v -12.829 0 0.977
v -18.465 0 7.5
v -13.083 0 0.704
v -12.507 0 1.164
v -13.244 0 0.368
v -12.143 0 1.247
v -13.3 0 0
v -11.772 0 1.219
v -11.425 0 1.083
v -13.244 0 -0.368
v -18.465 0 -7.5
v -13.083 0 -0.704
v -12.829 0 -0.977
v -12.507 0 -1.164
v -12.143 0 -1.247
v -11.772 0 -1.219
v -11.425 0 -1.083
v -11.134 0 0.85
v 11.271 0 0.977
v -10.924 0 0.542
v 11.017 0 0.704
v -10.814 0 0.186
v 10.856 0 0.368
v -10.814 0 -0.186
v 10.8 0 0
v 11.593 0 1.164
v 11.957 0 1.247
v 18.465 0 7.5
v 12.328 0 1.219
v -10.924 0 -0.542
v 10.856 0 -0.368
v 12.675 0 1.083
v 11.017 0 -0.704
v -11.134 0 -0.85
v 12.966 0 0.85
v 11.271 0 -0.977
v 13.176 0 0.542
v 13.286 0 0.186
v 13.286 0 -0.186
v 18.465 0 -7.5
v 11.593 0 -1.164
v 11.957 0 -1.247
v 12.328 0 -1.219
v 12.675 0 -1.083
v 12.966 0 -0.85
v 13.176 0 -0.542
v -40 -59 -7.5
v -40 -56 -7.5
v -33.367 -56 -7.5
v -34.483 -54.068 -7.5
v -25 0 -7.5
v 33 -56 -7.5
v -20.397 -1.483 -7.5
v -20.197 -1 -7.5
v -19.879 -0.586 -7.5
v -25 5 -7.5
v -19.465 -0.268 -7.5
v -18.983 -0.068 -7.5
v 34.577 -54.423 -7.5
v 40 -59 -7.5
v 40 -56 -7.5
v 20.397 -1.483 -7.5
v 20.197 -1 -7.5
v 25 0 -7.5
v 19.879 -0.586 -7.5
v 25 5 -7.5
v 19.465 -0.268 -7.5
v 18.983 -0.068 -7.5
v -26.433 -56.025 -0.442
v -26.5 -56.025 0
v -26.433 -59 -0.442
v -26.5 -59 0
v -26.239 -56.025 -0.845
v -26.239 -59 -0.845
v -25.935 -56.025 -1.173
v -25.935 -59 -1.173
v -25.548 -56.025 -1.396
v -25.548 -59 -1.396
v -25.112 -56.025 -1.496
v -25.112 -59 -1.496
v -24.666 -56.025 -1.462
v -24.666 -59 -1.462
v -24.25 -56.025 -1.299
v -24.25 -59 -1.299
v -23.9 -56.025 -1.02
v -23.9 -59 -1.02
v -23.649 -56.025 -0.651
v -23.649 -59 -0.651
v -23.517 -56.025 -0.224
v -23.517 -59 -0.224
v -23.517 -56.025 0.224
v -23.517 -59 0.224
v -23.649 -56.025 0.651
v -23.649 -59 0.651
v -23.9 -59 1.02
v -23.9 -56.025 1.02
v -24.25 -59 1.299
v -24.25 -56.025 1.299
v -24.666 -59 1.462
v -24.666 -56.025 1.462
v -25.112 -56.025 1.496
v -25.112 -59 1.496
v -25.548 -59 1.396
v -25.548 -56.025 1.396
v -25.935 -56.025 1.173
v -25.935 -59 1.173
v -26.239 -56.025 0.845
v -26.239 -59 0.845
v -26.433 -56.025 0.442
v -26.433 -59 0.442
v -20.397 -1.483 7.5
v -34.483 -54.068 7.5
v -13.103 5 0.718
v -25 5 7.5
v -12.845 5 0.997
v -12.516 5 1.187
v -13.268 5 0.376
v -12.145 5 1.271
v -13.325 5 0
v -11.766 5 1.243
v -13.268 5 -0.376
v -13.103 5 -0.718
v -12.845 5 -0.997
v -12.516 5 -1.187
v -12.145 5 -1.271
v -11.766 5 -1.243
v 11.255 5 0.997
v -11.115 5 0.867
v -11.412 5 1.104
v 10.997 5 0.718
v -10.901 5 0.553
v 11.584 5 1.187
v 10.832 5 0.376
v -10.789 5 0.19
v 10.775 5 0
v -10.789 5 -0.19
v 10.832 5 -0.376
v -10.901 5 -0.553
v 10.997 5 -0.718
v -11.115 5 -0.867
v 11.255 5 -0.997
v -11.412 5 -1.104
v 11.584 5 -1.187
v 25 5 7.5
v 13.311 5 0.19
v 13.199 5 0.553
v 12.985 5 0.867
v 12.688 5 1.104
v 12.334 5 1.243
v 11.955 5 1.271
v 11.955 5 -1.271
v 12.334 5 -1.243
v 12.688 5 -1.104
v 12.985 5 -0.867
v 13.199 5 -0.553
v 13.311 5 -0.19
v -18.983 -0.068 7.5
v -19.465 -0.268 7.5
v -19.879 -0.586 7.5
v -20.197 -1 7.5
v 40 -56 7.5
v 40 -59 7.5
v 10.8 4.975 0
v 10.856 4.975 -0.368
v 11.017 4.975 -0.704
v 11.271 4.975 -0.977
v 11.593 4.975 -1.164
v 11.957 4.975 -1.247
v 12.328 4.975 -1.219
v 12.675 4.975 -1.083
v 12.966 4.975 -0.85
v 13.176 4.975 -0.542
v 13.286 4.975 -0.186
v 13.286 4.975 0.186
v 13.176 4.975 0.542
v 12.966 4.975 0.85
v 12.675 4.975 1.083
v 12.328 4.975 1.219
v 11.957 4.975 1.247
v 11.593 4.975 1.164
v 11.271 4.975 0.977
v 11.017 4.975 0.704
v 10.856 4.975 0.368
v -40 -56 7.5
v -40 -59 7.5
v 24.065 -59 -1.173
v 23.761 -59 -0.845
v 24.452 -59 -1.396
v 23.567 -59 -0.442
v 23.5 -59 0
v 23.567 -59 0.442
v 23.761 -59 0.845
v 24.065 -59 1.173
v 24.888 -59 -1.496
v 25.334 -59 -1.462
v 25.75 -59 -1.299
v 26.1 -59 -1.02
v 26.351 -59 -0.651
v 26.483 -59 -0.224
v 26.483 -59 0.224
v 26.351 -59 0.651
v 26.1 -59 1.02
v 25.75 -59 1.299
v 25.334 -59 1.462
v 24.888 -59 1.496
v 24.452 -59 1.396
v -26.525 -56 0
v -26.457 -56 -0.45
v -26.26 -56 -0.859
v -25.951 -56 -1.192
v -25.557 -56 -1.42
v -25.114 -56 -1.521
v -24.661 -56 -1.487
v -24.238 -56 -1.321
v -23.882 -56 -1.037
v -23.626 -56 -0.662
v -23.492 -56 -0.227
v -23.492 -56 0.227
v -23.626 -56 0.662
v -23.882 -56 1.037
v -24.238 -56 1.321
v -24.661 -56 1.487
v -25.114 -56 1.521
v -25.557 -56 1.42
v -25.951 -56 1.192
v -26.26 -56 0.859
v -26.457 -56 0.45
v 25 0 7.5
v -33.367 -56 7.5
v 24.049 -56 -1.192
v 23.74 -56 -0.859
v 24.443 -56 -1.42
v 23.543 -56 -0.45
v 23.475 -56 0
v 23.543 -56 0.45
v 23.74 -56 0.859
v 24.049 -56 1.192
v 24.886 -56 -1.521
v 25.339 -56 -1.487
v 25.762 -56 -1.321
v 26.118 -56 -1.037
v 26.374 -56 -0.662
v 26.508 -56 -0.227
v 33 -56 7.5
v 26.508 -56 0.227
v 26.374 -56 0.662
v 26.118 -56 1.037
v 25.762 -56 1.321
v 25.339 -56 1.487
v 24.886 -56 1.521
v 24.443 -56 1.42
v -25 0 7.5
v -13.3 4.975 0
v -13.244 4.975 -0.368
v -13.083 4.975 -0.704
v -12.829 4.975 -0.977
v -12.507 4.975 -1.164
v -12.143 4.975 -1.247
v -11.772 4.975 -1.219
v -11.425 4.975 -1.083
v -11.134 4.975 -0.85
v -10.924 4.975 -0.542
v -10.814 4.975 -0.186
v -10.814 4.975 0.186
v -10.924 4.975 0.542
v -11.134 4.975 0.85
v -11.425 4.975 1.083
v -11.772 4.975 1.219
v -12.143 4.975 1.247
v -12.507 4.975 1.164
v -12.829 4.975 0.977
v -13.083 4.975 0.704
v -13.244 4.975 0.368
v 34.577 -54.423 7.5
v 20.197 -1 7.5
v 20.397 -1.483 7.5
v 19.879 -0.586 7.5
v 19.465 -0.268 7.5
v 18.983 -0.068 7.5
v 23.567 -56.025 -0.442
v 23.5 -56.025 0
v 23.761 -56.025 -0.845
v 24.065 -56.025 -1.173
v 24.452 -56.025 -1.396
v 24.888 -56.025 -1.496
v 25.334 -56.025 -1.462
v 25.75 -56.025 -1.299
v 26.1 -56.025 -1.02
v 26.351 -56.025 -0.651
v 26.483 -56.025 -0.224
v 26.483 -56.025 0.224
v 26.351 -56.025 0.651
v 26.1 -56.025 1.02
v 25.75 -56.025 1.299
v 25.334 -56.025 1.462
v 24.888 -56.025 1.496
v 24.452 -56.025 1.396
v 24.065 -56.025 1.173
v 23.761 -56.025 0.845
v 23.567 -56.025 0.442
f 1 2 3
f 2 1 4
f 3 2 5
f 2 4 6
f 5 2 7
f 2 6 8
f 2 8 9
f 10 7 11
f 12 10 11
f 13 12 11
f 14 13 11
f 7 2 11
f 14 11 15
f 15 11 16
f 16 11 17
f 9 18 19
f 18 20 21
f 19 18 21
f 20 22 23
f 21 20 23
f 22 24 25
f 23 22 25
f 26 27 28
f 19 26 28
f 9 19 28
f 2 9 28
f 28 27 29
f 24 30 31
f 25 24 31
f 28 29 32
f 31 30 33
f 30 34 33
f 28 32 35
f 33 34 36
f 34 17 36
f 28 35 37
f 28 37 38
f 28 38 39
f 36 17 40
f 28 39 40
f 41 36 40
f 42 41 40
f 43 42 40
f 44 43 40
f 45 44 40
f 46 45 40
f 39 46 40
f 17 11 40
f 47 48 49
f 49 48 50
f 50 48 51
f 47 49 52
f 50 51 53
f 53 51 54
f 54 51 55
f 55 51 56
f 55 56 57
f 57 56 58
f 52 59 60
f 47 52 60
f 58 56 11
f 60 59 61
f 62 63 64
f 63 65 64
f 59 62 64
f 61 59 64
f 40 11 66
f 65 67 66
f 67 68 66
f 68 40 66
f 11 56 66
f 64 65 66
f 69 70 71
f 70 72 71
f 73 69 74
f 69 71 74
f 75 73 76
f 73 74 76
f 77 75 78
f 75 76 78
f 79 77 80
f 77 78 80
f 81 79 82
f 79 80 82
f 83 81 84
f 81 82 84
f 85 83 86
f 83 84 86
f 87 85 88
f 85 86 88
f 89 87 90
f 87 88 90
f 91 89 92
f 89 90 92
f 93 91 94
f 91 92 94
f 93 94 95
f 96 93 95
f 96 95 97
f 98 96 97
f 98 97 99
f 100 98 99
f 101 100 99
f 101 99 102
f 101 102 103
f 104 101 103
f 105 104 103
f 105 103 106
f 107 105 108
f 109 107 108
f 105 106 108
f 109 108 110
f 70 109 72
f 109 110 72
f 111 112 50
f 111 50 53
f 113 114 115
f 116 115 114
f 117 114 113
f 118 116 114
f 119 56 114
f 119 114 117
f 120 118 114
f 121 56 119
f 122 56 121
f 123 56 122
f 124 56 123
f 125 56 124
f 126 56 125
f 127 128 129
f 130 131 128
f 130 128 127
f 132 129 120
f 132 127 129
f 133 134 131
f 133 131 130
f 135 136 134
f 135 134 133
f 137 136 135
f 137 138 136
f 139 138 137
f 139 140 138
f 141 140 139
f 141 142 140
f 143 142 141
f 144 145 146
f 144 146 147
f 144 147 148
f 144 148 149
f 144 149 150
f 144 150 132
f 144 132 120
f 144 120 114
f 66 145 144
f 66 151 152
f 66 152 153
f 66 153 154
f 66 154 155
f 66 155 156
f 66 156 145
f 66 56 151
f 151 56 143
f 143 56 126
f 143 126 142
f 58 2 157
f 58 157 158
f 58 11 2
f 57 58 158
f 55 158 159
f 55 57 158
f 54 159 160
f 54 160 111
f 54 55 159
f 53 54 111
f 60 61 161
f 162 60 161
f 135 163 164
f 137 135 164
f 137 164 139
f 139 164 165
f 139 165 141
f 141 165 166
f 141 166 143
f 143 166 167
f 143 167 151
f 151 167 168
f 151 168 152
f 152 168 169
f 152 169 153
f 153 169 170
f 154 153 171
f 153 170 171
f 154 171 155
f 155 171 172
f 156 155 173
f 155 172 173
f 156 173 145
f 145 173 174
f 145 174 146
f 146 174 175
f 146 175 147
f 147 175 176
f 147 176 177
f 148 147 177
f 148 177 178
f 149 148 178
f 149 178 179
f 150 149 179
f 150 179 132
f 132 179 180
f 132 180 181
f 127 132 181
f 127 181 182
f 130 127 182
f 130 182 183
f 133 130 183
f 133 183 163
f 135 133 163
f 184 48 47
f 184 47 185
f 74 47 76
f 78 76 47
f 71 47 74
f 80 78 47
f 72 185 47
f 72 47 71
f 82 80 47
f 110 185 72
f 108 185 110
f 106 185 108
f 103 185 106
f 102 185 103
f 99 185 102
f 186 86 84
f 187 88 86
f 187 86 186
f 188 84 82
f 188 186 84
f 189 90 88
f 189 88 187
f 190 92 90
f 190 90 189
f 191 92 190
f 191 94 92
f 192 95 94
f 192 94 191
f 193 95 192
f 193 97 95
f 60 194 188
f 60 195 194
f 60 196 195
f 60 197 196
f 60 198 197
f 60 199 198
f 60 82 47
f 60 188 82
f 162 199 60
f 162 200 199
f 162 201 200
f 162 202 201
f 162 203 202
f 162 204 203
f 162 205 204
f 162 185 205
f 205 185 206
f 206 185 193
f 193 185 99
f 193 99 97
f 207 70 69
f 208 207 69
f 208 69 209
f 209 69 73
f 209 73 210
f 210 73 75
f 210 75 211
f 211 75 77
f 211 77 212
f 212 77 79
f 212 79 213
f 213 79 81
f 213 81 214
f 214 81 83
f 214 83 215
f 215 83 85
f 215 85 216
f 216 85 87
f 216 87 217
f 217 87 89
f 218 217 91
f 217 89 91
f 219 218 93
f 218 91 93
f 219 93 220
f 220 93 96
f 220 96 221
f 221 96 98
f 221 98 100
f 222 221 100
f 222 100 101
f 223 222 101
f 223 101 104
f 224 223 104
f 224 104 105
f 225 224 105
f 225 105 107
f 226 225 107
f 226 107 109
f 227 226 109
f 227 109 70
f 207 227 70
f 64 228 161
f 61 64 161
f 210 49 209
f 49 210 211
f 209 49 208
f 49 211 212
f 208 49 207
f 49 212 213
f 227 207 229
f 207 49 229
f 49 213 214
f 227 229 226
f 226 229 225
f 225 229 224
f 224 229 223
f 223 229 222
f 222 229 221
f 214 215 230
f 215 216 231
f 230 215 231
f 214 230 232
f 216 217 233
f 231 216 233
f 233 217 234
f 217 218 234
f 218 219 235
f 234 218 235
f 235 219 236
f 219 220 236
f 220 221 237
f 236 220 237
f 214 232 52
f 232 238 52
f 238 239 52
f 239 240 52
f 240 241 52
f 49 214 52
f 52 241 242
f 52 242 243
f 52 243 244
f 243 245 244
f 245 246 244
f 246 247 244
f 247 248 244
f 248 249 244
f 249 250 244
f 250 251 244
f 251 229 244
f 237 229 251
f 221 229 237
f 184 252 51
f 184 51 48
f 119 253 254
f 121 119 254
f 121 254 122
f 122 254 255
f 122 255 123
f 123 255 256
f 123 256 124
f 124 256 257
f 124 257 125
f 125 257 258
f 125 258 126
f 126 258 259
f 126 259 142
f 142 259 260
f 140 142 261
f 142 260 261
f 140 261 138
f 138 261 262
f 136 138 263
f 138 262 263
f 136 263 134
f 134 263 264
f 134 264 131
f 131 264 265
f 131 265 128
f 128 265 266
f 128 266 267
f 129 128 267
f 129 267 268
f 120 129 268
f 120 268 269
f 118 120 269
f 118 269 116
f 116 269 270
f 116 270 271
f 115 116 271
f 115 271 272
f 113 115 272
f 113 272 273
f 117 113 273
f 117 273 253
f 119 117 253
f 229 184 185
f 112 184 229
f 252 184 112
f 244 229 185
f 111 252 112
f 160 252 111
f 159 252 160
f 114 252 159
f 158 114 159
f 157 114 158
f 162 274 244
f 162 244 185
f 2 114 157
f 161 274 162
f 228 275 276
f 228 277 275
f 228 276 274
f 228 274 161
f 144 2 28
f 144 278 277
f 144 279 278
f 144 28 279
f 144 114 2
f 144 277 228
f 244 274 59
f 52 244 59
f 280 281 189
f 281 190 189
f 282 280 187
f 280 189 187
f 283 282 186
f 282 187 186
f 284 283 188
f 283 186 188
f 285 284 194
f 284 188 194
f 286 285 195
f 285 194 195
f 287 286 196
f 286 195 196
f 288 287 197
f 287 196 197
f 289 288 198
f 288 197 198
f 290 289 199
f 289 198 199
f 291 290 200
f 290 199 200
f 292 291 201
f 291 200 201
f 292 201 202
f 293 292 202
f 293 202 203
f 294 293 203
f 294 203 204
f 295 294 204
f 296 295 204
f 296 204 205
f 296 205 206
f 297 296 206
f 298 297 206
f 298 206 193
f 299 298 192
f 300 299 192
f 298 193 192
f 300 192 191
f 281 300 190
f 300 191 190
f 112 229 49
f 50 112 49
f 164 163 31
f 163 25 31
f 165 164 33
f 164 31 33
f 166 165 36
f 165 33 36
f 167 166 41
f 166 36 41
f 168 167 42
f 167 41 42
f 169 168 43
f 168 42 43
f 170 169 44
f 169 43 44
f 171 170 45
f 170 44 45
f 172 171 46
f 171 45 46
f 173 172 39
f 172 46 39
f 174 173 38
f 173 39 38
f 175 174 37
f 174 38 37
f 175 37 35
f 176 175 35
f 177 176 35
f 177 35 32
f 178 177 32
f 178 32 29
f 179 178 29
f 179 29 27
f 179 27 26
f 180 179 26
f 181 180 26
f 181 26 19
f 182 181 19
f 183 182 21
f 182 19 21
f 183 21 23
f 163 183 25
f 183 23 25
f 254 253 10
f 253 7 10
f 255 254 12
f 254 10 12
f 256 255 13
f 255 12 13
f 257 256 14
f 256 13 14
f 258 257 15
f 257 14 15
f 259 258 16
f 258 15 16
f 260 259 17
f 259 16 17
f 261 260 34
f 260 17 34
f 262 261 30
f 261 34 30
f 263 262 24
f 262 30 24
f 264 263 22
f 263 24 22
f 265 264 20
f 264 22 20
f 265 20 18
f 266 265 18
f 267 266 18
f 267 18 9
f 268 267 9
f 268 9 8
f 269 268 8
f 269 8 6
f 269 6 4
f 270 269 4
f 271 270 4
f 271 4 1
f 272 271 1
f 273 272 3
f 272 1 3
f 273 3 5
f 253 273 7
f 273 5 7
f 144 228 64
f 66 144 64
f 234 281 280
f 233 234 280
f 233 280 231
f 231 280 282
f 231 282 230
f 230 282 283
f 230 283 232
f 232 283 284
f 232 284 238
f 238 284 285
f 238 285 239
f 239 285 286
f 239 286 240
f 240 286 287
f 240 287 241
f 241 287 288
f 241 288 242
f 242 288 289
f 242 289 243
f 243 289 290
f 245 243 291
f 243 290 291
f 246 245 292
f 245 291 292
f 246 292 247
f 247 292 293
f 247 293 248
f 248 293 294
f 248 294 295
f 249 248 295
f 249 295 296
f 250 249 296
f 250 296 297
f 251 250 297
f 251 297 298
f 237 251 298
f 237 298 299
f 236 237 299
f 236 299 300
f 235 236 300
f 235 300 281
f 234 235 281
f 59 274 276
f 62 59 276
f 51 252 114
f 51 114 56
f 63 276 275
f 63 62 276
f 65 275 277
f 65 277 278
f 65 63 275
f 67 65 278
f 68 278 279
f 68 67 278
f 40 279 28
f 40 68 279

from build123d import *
from OCP.BRepFilletAPI import BRepFilletAPI_MakeChamfer

# Parameters (mm, degrees)
SKETCH1_W                       = 50
SKETCH1_H                       = 15
BOSS_EXTRUDE1_DEPTH             = 5
BOSS_EXTRUDE2_DEPTH             = 15
FILLET1_R                       = 2
SKETCH3_W                       = 80
SKETCH3_H                       = 15
BOSS_EXTRUDE3_DEPTH             = 3
CHAMFER1_SIZE                   = 2
CHAMFER1_SIZE2                  = 1.633074145
F_3_0MM_DOWEL_HOLE1_D           = 3
F_3_0MM_DOWEL_HOLE1_DEPTH       = 20
F_3_0MM_DOWEL_HOLE1_CSINK_D     = 3.05
F_3_0MM_DOWEL_HOLE1_CSINK_ANGLE = 90
F_3_0MM_DOWEL_HOLE1_TIP         = 0.901290929
F_2_5MM_DOWEL_HOLE1_D           = 2.5
F_2_5MM_DOWEL_HOLE1_DEPTH       = 20
F_2_5MM_DOWEL_HOLE1_CSINK_D     = 2.55
F_2_5MM_DOWEL_HOLE1_CSINK_ANGLE = 90
F_2_5MM_DOWEL_HOLE1_TIP         = 0.751075774


with BuildPart() as part:
    # Sketch1 → Boss-Extrude1 (new body)
    with BuildSketch(Plane(origin=(0, 0, 0), x_dir=(1, 0, 0), z_dir=(0, 1, 0))):
        Rectangle(SKETCH1_W, SKETCH1_H)
    extrude(amount=BOSS_EXTRUDE1_DEPTH)

    # Sketch2 → Boss-Extrude2 (add)
    with BuildSketch(Plane.XY.offset(7.5)):
        Polygon((25, 0), (40, -56), (35, -56), (20, 0), align=None)
        Polygon((-25, 0), (-40, -56), (-35, -56), (-20, 0), align=None)
    extrude(amount=-BOSS_EXTRUDE2_DEPTH)

    # Fillet1
    fillet1_edges = [part.edges().sort_by_distance(p)[0] for p in [
        (20, 0, 0),
        (-20, 0, 0),
    ]]
    fillet(fillet1_edges, radius=FILLET1_R)

    # Sketch3 → Boss-Extrude3 (add)
    with BuildSketch(Plane.XZ.offset(56)):
        Rectangle(SKETCH3_W, SKETCH3_H)
    extrude(amount=BOSS_EXTRUDE3_DEPTH)

    # Chamfer1: one chamfer whose edges measure the first distance from different faces: ONE call of the kernel's chamfer builder (chamfer() names one face for all edges)
    chamfer1_edges_1 = [part.edges().sort_by_distance(p)[0] for p in [
        (35, -56, 0),
    ]]
    chamfer1_side_1 = [part.faces().sort_by_distance(p)[0] for p in [
        (0, -56, 0),
    ]]
    chamfer1_edges_2 = [part.edges().sort_by_distance(p)[0] for p in [
        (-35, -56, 0),
    ]]
    chamfer1_side_2 = [part.faces().sort_by_distance(p)[0] for p in [
        (-27.698552834, -28.741263915, 0),
    ]]
    chamfer1 = BRepFilletAPI_MakeChamfer(part.part.solid().wrapped)
    for e in chamfer1_edges_1:
        chamfer1.Add(CHAMFER1_SIZE, CHAMFER1_SIZE2, e.wrapped, chamfer1_side_1[0].wrapped)  # the first distance lies on this face
    for e in chamfer1_edges_2:
        chamfer1.Add(CHAMFER1_SIZE, CHAMFER1_SIZE2, e.wrapped, chamfer1_side_2[0].wrapped)  # the first distance lies on this face
    add(Compound.cast(chamfer1.Shape()), mode=Mode.REPLACE)

    # Ø3.0mm Dowel Hole1
    with Locations(Plane(origin=(0, -56, 0), x_dir=(1, 0, 0), z_dir=(0, 1, 0))):
        with Locations((-25, 0), (25, 0)):
            CounterSinkHole(F_3_0MM_DOWEL_HOLE1_D / 2, F_3_0MM_DOWEL_HOLE1_CSINK_D / 2, depth=F_3_0MM_DOWEL_HOLE1_DEPTH, counter_sink_angle=F_3_0MM_DOWEL_HOLE1_CSINK_ANGLE)
            with Locations((0, 0, -(F_3_0MM_DOWEL_HOLE1_DEPTH + F_3_0MM_DOWEL_HOLE1_TIP / 2))):  # 118° drill point
                Cone(0, F_3_0MM_DOWEL_HOLE1_D / 2, F_3_0MM_DOWEL_HOLE1_TIP, mode=Mode.SUBTRACT)

    # Ø2.5mm Dowel Hole1
    with Locations(Plane(origin=(0, 5, 0), x_dir=(1, 0, 0), z_dir=(0, 1, 0))):
        with Locations((-12.05, 0), (12.05, 0)):
            CounterSinkHole(F_2_5MM_DOWEL_HOLE1_D / 2, F_2_5MM_DOWEL_HOLE1_CSINK_D / 2, depth=F_2_5MM_DOWEL_HOLE1_DEPTH, counter_sink_angle=F_2_5MM_DOWEL_HOLE1_CSINK_ANGLE)
            with Locations((0, 0, -(F_2_5MM_DOWEL_HOLE1_DEPTH + F_2_5MM_DOWEL_HOLE1_TIP / 2))):  # 118° drill point
                Cone(0, F_2_5MM_DOWEL_HOLE1_D / 2, F_2_5MM_DOWEL_HOLE1_TIP, mode=Mode.SUBTRACT)


solid = part.part
